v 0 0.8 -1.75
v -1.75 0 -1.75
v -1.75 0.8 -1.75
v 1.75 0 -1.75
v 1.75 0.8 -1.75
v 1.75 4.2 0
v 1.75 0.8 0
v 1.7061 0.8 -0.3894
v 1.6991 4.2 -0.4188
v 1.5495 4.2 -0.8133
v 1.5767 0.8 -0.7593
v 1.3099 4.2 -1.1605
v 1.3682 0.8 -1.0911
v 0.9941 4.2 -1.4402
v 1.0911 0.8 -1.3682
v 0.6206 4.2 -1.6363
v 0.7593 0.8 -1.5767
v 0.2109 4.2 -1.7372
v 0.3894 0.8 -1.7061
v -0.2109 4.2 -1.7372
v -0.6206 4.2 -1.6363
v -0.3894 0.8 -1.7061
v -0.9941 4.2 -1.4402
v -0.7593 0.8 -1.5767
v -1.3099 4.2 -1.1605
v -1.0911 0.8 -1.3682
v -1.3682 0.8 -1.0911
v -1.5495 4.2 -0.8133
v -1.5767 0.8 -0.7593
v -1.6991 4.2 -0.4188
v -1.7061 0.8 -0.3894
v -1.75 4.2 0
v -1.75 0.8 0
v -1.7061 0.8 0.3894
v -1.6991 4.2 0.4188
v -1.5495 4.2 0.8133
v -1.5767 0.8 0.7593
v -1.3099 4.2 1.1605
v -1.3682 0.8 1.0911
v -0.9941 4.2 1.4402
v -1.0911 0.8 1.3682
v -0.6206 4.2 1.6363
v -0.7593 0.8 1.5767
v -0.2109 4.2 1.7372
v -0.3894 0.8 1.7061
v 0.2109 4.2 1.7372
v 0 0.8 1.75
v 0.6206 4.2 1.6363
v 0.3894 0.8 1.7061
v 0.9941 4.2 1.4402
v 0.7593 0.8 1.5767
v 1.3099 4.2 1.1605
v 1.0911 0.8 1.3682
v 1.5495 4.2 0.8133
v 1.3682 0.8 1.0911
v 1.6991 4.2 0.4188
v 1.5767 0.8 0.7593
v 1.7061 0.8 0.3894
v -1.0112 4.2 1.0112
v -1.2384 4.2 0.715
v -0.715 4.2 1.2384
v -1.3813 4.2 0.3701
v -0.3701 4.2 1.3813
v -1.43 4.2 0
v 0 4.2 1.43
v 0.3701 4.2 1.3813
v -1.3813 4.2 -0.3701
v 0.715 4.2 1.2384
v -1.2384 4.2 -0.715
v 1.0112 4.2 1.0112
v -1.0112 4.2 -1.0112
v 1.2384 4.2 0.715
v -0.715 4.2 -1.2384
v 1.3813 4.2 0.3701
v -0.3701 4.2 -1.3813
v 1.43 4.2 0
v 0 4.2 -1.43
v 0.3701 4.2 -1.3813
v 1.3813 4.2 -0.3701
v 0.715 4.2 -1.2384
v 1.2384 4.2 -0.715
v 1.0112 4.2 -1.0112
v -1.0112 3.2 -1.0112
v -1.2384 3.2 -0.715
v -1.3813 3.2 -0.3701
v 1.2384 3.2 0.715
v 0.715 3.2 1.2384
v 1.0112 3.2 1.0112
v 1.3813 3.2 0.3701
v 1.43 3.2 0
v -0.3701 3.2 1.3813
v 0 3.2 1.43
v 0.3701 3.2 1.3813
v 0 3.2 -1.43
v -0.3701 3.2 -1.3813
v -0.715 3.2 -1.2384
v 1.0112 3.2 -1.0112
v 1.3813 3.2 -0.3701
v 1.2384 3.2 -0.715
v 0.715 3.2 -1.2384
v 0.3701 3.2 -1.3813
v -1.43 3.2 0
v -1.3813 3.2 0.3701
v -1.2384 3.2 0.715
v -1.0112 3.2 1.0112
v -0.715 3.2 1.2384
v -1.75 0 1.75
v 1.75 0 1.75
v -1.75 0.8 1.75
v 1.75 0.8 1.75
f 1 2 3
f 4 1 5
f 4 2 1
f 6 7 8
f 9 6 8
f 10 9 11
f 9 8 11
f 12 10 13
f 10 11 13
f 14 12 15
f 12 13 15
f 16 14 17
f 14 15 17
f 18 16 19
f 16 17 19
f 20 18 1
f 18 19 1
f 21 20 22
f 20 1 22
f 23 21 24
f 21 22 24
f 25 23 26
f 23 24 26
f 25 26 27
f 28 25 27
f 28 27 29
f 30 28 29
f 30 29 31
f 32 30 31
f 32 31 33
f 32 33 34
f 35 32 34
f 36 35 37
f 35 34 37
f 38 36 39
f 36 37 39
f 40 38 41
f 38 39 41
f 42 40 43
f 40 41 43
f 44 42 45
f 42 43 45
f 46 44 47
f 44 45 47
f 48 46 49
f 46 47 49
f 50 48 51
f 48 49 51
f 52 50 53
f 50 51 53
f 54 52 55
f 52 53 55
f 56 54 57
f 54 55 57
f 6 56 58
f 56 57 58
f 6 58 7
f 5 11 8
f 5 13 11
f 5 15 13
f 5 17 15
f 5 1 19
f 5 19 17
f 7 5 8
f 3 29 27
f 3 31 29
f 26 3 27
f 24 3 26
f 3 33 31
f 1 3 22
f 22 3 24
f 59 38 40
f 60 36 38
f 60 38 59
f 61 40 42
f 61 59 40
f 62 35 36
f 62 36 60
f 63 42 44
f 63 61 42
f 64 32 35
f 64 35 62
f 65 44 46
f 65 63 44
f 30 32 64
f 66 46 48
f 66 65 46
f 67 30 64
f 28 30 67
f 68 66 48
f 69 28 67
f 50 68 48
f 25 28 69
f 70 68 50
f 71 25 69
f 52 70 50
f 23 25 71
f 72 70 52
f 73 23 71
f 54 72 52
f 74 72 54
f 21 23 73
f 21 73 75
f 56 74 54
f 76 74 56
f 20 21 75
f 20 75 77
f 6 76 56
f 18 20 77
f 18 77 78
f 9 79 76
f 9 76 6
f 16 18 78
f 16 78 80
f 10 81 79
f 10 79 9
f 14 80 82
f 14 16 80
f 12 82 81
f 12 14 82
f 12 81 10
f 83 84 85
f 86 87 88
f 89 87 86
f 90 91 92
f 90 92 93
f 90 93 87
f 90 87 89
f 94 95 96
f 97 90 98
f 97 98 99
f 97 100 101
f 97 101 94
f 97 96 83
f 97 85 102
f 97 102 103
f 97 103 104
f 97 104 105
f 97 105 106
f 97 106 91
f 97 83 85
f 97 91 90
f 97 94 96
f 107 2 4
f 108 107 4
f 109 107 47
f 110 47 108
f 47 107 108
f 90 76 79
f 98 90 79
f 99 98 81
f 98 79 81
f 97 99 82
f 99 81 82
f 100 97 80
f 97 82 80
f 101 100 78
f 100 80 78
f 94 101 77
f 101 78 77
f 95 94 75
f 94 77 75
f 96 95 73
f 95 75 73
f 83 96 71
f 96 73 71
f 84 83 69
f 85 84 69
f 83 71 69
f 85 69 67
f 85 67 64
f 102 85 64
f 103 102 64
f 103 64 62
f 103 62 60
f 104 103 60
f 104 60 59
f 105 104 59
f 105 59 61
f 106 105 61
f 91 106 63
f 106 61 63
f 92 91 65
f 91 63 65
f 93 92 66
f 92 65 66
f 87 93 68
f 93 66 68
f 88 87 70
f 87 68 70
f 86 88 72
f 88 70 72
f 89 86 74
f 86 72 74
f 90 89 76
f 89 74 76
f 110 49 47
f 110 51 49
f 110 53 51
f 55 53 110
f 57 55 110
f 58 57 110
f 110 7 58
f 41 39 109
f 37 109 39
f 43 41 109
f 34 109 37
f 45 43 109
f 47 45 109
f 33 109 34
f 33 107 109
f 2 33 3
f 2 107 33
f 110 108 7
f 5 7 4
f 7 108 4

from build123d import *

# Parameters (mm, degrees)
SKETCH1_W           = 3.5
SKETCH1_H           = 3.5
BOSS_EXTRUDE1_DEPTH = 0.8
SKETCH2_R           = 1.75
BOSS_EXTRUDE2_DEPTH = 3.4
SKETCH4_R           = 1.43
CUT_EXTRUDE1_DEPTH  = 1


with BuildPart() as part:
    # Sketch1 → Boss-Extrude1 (new body)
    with BuildSketch(Plane(origin=(0, 0, 0), x_dir=(1, 0, 0), z_dir=(0, 1, 0))):
        Rectangle(SKETCH1_W, SKETCH1_H)
    extrude(amount=BOSS_EXTRUDE1_DEPTH)

    # Sketch2 → Boss-Extrude2 (add)
    with BuildSketch(Plane(origin=(0, 0.8, 0), x_dir=(1, 0, 0), z_dir=(0, 1, 0))):
        Circle(SKETCH2_R)
    extrude(amount=BOSS_EXTRUDE2_DEPTH)

    # Sketch4 → Cut-Extrude1 (cut)
    with BuildSketch(Plane(origin=(0, 4.2, 0), x_dir=(1, 0, 0), z_dir=(0, 1, 0))):
        Circle(SKETCH4_R)
    extrude(amount=-CUT_EXTRUDE1_DEPTH, mode=Mode.SUBTRACT)


solid = part.part
